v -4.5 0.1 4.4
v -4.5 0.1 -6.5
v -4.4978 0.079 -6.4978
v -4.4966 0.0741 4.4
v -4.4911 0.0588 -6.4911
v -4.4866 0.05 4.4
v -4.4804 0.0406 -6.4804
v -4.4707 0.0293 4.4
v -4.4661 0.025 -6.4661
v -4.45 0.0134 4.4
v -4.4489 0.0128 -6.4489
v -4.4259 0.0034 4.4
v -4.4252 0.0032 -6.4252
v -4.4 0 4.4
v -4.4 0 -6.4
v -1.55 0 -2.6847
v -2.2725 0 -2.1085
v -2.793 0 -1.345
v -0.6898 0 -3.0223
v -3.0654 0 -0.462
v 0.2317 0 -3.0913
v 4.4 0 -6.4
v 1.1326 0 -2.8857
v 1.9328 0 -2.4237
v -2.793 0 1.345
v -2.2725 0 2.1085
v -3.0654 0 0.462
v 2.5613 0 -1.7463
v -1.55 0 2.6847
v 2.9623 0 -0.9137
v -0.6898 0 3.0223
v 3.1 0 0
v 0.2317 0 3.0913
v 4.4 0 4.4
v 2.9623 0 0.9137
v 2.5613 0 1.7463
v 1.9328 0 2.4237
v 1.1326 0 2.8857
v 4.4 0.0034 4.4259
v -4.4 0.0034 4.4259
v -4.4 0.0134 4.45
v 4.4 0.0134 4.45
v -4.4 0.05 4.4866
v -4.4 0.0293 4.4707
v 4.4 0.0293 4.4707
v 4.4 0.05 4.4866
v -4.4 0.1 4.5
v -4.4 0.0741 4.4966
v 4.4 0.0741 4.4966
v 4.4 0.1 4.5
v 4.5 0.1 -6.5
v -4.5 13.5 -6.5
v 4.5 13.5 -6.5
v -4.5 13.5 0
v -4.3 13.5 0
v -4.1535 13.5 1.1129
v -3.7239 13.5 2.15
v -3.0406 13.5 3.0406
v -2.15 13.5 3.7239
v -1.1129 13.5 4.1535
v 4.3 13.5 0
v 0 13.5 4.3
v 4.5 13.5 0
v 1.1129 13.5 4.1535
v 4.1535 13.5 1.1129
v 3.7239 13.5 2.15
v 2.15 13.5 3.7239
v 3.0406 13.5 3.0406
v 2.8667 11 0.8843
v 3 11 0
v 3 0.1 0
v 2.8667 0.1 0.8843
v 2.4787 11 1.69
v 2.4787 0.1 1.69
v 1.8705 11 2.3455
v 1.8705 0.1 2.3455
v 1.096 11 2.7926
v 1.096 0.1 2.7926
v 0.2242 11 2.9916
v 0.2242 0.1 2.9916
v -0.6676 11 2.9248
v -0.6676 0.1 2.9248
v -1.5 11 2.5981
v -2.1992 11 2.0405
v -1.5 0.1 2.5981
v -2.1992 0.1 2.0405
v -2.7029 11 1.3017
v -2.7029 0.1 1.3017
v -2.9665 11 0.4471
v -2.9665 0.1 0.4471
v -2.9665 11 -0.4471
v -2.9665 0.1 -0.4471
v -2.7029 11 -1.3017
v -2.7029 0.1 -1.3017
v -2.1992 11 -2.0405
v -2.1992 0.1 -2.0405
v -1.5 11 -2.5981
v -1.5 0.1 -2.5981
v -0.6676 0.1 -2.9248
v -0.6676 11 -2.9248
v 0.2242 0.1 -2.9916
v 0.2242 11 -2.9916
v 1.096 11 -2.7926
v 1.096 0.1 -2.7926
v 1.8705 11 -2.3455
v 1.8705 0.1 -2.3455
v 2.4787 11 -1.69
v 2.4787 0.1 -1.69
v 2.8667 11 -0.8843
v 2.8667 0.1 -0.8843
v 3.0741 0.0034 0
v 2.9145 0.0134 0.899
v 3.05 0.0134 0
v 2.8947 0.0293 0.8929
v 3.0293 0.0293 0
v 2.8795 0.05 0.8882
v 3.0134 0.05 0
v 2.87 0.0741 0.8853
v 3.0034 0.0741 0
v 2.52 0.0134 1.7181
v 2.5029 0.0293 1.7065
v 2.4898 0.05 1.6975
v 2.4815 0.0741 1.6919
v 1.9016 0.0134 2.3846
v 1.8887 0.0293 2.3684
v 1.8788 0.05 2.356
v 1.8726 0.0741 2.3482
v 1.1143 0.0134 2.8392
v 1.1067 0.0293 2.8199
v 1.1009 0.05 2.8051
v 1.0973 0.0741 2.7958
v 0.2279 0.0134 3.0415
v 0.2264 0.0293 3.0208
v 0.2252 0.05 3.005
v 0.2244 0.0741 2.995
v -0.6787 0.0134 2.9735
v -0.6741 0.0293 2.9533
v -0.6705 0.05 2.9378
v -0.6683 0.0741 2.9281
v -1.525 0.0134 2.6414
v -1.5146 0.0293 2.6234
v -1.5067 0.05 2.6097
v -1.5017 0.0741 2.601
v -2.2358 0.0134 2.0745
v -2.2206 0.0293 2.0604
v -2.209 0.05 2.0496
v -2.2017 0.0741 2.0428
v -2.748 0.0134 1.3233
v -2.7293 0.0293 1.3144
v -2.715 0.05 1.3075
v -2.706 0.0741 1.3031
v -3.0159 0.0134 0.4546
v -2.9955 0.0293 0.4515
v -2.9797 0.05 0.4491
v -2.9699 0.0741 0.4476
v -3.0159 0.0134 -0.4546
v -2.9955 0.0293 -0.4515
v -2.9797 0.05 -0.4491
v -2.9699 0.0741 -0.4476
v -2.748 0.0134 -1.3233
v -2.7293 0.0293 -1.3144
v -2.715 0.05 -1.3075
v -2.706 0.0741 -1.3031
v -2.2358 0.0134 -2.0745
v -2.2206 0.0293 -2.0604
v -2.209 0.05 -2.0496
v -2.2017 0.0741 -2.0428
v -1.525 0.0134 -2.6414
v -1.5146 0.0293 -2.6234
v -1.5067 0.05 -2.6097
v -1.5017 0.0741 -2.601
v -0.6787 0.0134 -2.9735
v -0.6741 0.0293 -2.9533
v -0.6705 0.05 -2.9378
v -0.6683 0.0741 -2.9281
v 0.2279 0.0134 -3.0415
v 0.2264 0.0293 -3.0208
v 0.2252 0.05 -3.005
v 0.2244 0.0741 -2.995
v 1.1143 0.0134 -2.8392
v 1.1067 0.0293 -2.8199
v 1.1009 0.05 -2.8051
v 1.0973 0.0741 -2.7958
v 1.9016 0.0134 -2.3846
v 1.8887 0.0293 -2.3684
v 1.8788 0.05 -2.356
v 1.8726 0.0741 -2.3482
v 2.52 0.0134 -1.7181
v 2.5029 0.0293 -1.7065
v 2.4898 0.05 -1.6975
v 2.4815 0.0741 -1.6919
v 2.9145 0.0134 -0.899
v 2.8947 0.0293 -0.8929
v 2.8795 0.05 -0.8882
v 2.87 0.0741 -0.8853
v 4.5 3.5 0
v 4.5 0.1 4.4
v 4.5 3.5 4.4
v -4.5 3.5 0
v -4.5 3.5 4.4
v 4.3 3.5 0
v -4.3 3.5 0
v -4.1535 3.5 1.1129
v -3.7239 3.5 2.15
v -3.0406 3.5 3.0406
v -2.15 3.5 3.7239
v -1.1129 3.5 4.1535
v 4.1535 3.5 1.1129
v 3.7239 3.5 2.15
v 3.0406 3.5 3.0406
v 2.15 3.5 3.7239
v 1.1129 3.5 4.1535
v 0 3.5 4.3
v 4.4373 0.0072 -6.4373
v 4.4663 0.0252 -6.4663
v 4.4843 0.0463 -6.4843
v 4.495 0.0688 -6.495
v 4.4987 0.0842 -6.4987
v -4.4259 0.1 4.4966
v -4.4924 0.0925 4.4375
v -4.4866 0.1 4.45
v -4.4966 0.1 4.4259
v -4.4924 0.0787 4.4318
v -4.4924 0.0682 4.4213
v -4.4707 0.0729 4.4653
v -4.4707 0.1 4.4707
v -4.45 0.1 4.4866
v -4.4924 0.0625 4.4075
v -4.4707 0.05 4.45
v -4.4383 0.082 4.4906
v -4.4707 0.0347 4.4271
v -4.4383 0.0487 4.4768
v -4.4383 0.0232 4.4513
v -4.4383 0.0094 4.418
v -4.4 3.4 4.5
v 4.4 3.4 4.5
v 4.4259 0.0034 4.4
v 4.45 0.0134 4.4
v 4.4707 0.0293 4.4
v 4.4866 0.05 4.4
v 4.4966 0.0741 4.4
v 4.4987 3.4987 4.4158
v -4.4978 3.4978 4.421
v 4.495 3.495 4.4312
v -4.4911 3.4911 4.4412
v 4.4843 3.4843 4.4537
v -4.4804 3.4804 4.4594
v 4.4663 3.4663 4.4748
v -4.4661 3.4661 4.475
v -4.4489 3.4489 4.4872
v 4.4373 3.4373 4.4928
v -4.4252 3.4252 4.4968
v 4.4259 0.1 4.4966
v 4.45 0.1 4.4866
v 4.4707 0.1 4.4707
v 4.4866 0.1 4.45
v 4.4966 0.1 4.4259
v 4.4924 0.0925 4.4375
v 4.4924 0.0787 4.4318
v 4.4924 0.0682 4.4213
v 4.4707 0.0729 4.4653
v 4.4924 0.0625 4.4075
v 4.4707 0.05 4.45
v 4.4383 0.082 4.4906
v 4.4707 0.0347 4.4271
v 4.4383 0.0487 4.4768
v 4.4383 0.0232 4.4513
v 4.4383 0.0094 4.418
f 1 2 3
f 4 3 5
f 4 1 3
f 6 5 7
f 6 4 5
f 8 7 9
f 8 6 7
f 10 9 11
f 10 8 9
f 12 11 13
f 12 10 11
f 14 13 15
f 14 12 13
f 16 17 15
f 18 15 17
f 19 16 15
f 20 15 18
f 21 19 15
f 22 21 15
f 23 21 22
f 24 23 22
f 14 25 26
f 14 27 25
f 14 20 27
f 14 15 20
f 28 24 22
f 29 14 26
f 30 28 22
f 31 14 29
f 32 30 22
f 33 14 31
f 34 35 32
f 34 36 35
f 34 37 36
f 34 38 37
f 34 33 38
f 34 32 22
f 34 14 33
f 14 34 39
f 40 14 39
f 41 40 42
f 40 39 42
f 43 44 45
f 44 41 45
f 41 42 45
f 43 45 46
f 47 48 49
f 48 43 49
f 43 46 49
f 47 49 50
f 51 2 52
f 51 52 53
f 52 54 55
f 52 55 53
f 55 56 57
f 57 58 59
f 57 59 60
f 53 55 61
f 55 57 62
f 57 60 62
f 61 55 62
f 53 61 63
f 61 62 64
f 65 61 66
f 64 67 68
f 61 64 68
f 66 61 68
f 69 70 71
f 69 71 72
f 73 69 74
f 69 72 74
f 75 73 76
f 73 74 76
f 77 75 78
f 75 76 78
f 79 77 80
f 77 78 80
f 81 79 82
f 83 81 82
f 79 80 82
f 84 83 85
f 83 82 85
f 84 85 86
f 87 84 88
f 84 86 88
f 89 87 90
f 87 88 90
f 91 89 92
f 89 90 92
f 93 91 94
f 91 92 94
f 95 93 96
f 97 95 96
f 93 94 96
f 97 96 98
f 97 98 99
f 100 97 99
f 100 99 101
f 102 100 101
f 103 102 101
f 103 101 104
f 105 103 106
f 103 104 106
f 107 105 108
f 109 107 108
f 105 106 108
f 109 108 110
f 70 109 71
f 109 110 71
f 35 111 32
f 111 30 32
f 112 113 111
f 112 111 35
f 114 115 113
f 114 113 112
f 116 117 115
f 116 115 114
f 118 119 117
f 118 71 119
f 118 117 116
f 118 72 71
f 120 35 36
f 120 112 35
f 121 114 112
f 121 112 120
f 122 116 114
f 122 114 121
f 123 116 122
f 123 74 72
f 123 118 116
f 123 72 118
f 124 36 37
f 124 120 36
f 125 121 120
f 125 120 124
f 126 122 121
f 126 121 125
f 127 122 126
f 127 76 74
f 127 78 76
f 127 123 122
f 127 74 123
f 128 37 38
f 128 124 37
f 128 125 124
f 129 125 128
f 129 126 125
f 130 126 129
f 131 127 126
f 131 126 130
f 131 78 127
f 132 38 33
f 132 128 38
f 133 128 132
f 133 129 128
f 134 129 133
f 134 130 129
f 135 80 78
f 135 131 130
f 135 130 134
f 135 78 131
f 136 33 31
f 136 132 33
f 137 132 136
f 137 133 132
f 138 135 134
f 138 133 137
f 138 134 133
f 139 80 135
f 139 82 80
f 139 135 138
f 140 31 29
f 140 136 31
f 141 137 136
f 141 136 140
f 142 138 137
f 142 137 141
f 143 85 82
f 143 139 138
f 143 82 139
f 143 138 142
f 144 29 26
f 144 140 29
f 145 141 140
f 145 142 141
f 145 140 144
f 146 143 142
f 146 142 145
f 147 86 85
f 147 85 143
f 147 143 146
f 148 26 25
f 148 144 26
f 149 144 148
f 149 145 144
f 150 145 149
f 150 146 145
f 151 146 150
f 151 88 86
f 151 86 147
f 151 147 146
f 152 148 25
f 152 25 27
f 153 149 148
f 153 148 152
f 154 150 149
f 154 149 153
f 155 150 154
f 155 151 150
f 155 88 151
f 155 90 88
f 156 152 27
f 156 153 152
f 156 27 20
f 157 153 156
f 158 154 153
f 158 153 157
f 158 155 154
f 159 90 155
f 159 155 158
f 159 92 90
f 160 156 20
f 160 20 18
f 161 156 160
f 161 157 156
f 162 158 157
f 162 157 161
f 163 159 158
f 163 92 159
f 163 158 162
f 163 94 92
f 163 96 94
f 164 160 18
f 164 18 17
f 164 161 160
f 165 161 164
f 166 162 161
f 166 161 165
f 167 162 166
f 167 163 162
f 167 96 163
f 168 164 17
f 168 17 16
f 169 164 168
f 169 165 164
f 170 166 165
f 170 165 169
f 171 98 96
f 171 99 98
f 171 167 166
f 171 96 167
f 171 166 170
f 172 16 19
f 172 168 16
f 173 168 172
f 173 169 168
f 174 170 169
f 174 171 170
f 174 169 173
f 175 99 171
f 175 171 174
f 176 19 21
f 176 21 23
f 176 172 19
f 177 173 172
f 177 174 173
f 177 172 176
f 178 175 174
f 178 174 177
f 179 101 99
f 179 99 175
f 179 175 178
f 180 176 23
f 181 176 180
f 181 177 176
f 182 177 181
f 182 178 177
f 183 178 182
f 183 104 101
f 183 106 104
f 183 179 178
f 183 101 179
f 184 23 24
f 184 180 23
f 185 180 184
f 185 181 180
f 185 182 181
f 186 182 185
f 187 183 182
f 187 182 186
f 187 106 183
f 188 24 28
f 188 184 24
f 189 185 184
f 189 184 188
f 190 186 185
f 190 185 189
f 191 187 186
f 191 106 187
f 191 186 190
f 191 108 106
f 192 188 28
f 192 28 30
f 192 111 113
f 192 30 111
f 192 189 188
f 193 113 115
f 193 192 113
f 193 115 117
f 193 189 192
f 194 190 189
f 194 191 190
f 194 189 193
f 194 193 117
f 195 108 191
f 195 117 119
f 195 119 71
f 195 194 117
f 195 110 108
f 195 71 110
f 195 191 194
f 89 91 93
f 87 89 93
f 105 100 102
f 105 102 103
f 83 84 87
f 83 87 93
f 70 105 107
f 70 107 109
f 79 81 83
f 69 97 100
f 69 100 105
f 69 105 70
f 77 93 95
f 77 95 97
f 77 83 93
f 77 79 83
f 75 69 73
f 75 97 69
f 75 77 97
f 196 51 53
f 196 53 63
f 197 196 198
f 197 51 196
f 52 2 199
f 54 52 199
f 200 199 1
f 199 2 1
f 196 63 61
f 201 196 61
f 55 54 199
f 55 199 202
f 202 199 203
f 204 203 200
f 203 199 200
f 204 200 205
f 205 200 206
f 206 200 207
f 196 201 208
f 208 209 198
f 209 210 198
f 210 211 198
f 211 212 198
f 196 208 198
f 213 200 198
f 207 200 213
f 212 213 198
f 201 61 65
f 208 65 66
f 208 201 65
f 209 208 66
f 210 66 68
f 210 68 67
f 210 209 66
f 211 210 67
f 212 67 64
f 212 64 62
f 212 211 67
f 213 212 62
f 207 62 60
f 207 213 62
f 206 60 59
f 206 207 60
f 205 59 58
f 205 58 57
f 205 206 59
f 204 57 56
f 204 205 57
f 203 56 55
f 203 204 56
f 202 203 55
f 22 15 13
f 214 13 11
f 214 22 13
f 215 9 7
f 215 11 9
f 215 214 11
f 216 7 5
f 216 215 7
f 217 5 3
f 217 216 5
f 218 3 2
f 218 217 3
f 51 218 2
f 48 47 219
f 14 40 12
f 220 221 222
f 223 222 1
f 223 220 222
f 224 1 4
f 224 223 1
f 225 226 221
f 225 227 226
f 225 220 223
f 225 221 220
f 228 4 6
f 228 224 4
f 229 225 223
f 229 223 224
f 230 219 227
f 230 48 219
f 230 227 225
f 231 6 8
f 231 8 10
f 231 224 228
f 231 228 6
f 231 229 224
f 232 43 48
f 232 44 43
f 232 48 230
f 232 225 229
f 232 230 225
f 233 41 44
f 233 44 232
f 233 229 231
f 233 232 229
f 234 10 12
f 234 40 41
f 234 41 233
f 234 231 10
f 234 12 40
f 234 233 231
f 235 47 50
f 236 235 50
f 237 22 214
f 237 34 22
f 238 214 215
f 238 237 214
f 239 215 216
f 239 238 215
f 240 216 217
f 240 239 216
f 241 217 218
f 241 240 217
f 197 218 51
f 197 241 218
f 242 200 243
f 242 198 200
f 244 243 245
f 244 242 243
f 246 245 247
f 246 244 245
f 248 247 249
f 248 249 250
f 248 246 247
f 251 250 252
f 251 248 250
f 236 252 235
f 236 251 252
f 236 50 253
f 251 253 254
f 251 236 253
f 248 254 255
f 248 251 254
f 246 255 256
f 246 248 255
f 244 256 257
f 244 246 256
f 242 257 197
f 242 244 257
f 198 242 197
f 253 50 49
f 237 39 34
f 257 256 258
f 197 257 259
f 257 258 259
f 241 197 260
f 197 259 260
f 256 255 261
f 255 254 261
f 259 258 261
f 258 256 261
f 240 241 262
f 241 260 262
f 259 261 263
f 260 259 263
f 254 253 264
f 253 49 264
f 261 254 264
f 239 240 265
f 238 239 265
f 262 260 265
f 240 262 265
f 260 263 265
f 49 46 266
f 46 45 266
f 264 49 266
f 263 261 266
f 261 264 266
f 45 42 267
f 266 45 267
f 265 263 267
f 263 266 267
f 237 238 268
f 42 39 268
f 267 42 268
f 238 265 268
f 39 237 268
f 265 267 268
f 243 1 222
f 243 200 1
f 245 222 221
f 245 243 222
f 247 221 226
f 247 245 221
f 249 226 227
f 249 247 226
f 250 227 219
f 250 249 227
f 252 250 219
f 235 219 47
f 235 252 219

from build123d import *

# Parameters (mm, degrees)
SKETCH_W     = 9
SKETCH_H     = 11
PAD_DEPTH    = 3.5
PAD001_DEPTH = 13.5
SKETCH002_R  = 3
POCKET_DEPTH = 11
FILLET_R     = 0.1


with BuildPart() as part:
    # Sketch → Pad (new body)
    with BuildSketch(Plane.XZ):
        with Locations((0, -1)):
            Rectangle(SKETCH_W, SKETCH_H)
    extrude(amount=-PAD_DEPTH)

    # Sketch001 (on Face5 of Pad) → Pad001 (join)
    with BuildSketch(Plane.XZ):
        with BuildLine():
            Line((-4.5, -6.5), (4.5, -6.5))
            Line((4.5, -6.5), (4.5, 0))
            Line((4.5, 0), (4.3, 0))
            ThreePointArc((4.3, 0), (0, 4.3), (-4.3, 0))
            Line((-4.5, 0), (-4.3, 0))
            Line((-4.5, 0), (-4.5, -6.5))
        make_face()
    extrude(amount=-PAD001_DEPTH)

    # Sketch002 (on Face8 of Pad001) → Pocket (cut)
    with BuildSketch(Plane.XZ):
        Circle(SKETCH002_R)
    extrude(amount=-POCKET_DEPTH, mode=Mode.SUBTRACT)

    # Fillet
    fillet_edges = [part.edges().sort_by_distance(p)[0] for p in [
        (0, 0, 4.5),
        (4.5, 1.75, 4.5),
        (0, 3.5, 4.5),
        (-4.5, 1.75, 4.5),
        (4.5, 0, 2.25),
        (-4.5, 0, 2.25),
        (0, 0, -6.5),
        (-3, 0, 0),
    ]]
    fillet(fillet_edges, radius=FILLET_R)


solid = part.part
